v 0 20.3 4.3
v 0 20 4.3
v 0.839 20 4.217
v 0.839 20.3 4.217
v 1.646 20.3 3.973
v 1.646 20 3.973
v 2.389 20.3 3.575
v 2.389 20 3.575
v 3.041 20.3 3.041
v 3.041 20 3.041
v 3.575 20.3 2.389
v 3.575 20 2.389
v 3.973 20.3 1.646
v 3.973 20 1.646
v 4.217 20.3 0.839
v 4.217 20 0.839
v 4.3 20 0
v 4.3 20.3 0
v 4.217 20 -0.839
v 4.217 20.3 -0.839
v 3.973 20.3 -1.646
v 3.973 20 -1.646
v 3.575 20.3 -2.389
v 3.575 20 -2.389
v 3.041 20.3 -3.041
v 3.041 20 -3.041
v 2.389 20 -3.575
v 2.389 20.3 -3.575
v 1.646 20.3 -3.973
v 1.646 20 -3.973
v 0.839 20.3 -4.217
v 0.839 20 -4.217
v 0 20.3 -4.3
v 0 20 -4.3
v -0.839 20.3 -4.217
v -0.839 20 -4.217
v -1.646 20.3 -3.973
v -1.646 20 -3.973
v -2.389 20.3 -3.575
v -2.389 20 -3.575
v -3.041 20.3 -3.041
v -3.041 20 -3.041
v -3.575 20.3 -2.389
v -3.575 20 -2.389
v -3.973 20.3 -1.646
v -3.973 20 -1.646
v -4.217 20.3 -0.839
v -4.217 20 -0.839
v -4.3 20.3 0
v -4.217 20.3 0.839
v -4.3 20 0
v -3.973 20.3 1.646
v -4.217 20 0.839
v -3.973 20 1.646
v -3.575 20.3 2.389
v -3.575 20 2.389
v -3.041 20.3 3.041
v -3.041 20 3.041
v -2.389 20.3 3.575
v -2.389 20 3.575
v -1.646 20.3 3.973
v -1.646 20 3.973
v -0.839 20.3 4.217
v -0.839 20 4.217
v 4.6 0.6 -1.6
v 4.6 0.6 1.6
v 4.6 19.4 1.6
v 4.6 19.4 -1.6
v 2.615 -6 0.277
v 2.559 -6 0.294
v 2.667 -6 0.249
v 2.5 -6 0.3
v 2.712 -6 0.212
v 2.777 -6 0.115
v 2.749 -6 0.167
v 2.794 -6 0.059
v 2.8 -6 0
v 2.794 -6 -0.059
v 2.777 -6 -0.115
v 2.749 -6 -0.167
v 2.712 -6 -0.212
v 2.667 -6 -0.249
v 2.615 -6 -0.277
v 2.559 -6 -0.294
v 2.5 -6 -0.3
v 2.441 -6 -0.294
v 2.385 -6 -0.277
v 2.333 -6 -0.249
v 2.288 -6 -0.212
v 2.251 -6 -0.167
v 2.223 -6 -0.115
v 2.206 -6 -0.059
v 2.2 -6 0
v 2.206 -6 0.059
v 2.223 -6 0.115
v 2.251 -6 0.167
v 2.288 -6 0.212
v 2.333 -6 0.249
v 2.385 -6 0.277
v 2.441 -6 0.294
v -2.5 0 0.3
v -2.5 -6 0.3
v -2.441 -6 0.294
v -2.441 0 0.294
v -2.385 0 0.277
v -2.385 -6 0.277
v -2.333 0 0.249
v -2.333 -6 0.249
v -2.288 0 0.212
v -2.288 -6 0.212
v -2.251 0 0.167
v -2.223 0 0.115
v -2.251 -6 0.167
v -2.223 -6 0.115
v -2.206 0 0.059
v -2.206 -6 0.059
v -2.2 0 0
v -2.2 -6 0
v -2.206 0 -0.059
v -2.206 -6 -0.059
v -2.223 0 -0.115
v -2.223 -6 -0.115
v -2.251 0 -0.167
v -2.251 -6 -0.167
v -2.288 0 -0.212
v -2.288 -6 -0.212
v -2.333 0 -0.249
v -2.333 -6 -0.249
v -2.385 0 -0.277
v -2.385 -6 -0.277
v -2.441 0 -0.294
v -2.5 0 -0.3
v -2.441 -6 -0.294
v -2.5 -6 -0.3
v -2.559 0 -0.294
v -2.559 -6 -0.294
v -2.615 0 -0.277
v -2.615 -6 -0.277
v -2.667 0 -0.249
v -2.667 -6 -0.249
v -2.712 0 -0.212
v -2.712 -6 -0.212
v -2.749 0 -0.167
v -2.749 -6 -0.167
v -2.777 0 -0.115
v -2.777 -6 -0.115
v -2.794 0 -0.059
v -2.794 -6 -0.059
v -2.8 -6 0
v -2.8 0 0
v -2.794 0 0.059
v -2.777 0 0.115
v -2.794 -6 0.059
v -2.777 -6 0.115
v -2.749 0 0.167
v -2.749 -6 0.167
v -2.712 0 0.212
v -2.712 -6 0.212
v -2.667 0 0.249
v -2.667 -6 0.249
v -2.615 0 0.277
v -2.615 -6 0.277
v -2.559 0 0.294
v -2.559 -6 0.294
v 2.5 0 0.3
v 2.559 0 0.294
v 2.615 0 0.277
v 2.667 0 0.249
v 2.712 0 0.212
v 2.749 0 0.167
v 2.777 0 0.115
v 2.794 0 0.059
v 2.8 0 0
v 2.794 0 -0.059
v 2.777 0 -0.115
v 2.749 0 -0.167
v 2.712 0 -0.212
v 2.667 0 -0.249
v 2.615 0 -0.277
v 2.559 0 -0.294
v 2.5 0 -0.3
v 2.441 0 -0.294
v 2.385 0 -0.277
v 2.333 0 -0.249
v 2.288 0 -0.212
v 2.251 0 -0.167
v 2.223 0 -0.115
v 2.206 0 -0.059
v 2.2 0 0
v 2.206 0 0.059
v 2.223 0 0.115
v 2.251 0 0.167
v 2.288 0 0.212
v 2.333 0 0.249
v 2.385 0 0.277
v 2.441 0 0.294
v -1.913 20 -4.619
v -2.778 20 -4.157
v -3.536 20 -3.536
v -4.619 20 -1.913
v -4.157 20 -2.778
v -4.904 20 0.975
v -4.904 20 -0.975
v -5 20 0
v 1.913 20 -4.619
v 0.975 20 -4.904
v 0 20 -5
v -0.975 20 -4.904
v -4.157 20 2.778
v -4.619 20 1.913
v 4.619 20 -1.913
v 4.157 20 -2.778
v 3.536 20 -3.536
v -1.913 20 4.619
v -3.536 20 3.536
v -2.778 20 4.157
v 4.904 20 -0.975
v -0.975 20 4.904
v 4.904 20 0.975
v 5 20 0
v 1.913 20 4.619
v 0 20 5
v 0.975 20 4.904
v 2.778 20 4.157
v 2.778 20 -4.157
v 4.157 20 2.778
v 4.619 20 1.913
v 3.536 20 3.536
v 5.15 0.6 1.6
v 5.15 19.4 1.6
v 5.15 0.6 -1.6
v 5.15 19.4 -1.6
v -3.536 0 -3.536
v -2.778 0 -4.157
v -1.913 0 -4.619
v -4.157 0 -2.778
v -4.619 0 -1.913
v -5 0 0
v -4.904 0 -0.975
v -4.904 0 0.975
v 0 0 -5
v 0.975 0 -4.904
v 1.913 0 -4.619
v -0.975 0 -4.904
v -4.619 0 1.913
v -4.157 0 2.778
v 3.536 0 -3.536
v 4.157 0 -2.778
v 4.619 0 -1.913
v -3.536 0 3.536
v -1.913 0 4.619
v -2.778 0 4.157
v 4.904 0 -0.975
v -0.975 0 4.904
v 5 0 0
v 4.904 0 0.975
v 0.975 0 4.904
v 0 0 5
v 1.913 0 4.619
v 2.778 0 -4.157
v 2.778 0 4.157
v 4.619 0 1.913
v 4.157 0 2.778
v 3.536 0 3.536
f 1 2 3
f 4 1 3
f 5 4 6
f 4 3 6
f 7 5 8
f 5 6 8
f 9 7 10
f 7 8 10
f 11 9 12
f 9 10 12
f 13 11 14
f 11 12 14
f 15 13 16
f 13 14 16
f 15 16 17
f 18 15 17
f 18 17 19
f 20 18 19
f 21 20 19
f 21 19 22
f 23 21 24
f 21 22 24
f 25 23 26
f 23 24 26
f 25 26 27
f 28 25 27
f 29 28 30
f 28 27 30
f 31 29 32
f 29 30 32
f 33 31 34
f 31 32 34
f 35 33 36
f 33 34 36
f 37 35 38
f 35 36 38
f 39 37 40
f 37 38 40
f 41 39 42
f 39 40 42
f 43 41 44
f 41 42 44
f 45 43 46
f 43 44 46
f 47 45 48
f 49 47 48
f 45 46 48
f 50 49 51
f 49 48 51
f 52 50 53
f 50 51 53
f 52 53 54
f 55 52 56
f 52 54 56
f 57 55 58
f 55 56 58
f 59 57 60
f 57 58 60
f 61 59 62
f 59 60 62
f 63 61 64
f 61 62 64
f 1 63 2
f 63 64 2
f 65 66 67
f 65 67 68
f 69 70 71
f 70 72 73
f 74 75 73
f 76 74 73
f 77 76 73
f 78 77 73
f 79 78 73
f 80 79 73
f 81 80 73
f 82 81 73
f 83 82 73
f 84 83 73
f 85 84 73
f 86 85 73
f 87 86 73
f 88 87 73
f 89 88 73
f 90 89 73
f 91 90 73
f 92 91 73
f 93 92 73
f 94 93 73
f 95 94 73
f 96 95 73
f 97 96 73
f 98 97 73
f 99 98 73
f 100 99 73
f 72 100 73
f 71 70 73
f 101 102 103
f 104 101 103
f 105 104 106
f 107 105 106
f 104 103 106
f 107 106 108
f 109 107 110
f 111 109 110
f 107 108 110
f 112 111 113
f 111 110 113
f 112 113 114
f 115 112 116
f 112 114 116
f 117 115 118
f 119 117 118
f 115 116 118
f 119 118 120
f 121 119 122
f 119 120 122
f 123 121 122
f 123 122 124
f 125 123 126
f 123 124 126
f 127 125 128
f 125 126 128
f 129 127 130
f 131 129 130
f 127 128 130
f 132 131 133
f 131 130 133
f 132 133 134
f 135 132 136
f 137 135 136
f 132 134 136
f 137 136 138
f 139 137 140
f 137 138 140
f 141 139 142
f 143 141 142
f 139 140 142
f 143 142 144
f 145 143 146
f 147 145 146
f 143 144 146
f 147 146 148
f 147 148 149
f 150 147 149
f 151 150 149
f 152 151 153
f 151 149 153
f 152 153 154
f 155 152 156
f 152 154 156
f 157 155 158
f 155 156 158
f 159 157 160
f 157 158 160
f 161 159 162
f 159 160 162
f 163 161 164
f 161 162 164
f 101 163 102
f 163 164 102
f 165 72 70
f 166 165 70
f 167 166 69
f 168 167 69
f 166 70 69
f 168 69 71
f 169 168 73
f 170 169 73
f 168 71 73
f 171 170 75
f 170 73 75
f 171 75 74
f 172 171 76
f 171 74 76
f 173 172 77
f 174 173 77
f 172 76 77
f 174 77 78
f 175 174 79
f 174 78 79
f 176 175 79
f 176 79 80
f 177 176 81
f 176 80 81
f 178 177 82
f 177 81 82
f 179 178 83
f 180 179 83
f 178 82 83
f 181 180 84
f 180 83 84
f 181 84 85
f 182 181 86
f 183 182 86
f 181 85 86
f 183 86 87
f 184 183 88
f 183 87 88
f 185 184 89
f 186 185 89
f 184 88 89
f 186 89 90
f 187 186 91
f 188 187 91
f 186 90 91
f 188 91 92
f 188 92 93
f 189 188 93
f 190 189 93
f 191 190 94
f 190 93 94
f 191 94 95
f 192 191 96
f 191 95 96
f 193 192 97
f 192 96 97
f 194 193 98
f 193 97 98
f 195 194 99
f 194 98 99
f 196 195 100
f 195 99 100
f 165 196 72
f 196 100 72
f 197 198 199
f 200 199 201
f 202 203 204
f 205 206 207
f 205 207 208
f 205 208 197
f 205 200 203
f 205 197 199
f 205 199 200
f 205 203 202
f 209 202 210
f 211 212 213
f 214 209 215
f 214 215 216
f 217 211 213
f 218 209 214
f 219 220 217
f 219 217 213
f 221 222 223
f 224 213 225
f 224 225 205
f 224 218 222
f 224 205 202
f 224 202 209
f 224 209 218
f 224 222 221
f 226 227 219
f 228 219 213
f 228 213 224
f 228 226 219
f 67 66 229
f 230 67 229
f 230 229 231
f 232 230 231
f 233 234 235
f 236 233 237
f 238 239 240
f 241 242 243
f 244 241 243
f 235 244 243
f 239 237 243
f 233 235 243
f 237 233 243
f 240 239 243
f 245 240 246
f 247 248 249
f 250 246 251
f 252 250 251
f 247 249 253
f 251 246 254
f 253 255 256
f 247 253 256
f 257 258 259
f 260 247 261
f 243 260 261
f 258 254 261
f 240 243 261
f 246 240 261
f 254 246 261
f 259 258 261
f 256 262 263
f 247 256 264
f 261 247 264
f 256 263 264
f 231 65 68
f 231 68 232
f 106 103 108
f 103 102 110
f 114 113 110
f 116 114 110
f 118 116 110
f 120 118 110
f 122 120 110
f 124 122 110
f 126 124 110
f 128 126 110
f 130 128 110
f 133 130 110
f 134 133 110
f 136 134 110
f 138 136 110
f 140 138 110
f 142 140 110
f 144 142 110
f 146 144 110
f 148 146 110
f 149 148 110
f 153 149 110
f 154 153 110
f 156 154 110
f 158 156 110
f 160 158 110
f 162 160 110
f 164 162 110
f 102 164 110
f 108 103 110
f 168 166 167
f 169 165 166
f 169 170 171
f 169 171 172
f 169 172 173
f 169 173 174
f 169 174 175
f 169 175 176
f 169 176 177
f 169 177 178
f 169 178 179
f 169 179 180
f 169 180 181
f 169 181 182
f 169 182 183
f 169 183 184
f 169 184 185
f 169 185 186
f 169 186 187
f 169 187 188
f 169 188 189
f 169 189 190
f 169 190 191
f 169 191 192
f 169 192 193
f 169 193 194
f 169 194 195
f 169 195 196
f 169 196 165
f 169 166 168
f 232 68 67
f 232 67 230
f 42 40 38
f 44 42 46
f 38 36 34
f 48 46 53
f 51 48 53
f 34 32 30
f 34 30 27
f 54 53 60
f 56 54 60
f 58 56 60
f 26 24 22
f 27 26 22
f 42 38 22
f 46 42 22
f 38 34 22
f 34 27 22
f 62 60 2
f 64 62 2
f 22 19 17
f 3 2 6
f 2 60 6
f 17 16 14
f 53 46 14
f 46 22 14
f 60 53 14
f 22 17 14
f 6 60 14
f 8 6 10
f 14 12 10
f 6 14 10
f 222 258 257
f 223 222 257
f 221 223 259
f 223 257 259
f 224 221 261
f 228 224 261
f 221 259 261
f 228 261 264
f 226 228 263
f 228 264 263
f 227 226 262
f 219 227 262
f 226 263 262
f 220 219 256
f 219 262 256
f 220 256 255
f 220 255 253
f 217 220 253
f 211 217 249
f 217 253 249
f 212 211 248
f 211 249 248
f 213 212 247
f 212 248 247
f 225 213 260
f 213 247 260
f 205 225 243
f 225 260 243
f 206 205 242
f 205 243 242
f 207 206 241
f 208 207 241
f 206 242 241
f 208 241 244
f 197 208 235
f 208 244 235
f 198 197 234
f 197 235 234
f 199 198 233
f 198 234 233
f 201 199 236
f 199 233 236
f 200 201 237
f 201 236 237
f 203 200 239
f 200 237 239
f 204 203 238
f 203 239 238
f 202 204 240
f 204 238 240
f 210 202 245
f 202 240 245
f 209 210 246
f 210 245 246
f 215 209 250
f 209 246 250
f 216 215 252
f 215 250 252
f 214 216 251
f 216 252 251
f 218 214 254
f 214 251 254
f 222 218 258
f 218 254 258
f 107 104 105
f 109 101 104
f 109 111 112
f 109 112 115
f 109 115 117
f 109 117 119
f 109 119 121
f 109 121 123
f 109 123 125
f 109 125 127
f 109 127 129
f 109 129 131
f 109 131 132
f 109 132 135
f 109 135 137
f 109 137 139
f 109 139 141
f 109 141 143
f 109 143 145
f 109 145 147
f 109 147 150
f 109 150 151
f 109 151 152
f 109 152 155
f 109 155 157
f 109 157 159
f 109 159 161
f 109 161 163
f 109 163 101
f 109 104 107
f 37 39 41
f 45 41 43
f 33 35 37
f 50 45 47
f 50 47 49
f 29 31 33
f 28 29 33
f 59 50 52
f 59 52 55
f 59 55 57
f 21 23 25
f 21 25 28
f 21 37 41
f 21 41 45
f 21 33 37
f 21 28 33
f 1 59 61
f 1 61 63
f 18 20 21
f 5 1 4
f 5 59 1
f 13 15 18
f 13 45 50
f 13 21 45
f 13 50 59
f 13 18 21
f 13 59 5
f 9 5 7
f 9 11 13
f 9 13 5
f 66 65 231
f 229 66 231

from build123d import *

# Parameters (mm, degrees)
SK_CAN_R           = 5
CAN_DEPTH          = 20
TOP_START          = 20
SK_TOP_DISC_R      = 4.3
TOP_DISC_DEPTH     = 0.3
MINUS_START        = 0.6
SK_MINUS_STRIPE_W  = 0.55
SK_MINUS_STRIPE_H  = 3.2
MINUS_STRIPE_DEPTH = 18.8
LEADS_START        = -6
SK_LEADS_R         = 0.3
LEADS_DEPTH        = 6
LEADS_2_DEPTH      = 6


with BuildPart() as part:
    # SK Can → Can (new body)
    with BuildSketch(Plane(origin=(0, 0, 0), x_dir=(1, 0, 0), z_dir=(0, 1, 0))):
        with Locations(Location((0, 0, 0), (0, 0, 270))):
            Circle(SK_CAN_R)
    extrude(amount=CAN_DEPTH)


with BuildPart() as body_2:
    # SK Top disc → Top disc (new body)
    with BuildSketch(Plane(origin=(0, 0, 0), x_dir=(1, 0, 0), z_dir=(0, 1, 0)).offset(TOP_START)):
        with Locations(Location((0, 0, 0), (0, 0, 270))):
            Circle(SK_TOP_DISC_R)
    extrude(amount=TOP_DISC_DEPTH)


with BuildPart() as body_3:
    # SK Minus stripe → Minus stripe (new body)
    with BuildSketch(Plane(origin=(0, 0, 0), x_dir=(1, 0, 0), z_dir=(0, 1, 0)).offset(MINUS_START)):
        with Locations((4.875, 0)):
            Rectangle(SK_MINUS_STRIPE_W, SK_MINUS_STRIPE_H)
    extrude(amount=MINUS_STRIPE_DEPTH)


with BuildPart() as body_4:
    # SK Leads → Leads (new body)
    with BuildSketch(Plane(origin=(0, 0, 0), x_dir=(1, 0, 0), z_dir=(0, 1, 0)).offset(LEADS_START)):
        with Locations(Location((-2.5, 0, 0), (0, 0, 270))):
            Circle(SK_LEADS_R)
    extrude(amount=LEADS_DEPTH)


with BuildPart() as body_5:
    # SK Leads → Leads 2 (new body)
    with BuildSketch(Plane(origin=(0, 0, 0), x_dir=(1, 0, 0), z_dir=(0, 1, 0)).offset(LEADS_START)):
        with Locations(Location((2.5, 0, 0), (0, 0, 270))):
            Circle(SK_LEADS_R)
    extrude(amount=LEADS_2_DEPTH)


solid = Compound([part.part, body_2.part, body_3.part, body_4.part, body_5.part])
